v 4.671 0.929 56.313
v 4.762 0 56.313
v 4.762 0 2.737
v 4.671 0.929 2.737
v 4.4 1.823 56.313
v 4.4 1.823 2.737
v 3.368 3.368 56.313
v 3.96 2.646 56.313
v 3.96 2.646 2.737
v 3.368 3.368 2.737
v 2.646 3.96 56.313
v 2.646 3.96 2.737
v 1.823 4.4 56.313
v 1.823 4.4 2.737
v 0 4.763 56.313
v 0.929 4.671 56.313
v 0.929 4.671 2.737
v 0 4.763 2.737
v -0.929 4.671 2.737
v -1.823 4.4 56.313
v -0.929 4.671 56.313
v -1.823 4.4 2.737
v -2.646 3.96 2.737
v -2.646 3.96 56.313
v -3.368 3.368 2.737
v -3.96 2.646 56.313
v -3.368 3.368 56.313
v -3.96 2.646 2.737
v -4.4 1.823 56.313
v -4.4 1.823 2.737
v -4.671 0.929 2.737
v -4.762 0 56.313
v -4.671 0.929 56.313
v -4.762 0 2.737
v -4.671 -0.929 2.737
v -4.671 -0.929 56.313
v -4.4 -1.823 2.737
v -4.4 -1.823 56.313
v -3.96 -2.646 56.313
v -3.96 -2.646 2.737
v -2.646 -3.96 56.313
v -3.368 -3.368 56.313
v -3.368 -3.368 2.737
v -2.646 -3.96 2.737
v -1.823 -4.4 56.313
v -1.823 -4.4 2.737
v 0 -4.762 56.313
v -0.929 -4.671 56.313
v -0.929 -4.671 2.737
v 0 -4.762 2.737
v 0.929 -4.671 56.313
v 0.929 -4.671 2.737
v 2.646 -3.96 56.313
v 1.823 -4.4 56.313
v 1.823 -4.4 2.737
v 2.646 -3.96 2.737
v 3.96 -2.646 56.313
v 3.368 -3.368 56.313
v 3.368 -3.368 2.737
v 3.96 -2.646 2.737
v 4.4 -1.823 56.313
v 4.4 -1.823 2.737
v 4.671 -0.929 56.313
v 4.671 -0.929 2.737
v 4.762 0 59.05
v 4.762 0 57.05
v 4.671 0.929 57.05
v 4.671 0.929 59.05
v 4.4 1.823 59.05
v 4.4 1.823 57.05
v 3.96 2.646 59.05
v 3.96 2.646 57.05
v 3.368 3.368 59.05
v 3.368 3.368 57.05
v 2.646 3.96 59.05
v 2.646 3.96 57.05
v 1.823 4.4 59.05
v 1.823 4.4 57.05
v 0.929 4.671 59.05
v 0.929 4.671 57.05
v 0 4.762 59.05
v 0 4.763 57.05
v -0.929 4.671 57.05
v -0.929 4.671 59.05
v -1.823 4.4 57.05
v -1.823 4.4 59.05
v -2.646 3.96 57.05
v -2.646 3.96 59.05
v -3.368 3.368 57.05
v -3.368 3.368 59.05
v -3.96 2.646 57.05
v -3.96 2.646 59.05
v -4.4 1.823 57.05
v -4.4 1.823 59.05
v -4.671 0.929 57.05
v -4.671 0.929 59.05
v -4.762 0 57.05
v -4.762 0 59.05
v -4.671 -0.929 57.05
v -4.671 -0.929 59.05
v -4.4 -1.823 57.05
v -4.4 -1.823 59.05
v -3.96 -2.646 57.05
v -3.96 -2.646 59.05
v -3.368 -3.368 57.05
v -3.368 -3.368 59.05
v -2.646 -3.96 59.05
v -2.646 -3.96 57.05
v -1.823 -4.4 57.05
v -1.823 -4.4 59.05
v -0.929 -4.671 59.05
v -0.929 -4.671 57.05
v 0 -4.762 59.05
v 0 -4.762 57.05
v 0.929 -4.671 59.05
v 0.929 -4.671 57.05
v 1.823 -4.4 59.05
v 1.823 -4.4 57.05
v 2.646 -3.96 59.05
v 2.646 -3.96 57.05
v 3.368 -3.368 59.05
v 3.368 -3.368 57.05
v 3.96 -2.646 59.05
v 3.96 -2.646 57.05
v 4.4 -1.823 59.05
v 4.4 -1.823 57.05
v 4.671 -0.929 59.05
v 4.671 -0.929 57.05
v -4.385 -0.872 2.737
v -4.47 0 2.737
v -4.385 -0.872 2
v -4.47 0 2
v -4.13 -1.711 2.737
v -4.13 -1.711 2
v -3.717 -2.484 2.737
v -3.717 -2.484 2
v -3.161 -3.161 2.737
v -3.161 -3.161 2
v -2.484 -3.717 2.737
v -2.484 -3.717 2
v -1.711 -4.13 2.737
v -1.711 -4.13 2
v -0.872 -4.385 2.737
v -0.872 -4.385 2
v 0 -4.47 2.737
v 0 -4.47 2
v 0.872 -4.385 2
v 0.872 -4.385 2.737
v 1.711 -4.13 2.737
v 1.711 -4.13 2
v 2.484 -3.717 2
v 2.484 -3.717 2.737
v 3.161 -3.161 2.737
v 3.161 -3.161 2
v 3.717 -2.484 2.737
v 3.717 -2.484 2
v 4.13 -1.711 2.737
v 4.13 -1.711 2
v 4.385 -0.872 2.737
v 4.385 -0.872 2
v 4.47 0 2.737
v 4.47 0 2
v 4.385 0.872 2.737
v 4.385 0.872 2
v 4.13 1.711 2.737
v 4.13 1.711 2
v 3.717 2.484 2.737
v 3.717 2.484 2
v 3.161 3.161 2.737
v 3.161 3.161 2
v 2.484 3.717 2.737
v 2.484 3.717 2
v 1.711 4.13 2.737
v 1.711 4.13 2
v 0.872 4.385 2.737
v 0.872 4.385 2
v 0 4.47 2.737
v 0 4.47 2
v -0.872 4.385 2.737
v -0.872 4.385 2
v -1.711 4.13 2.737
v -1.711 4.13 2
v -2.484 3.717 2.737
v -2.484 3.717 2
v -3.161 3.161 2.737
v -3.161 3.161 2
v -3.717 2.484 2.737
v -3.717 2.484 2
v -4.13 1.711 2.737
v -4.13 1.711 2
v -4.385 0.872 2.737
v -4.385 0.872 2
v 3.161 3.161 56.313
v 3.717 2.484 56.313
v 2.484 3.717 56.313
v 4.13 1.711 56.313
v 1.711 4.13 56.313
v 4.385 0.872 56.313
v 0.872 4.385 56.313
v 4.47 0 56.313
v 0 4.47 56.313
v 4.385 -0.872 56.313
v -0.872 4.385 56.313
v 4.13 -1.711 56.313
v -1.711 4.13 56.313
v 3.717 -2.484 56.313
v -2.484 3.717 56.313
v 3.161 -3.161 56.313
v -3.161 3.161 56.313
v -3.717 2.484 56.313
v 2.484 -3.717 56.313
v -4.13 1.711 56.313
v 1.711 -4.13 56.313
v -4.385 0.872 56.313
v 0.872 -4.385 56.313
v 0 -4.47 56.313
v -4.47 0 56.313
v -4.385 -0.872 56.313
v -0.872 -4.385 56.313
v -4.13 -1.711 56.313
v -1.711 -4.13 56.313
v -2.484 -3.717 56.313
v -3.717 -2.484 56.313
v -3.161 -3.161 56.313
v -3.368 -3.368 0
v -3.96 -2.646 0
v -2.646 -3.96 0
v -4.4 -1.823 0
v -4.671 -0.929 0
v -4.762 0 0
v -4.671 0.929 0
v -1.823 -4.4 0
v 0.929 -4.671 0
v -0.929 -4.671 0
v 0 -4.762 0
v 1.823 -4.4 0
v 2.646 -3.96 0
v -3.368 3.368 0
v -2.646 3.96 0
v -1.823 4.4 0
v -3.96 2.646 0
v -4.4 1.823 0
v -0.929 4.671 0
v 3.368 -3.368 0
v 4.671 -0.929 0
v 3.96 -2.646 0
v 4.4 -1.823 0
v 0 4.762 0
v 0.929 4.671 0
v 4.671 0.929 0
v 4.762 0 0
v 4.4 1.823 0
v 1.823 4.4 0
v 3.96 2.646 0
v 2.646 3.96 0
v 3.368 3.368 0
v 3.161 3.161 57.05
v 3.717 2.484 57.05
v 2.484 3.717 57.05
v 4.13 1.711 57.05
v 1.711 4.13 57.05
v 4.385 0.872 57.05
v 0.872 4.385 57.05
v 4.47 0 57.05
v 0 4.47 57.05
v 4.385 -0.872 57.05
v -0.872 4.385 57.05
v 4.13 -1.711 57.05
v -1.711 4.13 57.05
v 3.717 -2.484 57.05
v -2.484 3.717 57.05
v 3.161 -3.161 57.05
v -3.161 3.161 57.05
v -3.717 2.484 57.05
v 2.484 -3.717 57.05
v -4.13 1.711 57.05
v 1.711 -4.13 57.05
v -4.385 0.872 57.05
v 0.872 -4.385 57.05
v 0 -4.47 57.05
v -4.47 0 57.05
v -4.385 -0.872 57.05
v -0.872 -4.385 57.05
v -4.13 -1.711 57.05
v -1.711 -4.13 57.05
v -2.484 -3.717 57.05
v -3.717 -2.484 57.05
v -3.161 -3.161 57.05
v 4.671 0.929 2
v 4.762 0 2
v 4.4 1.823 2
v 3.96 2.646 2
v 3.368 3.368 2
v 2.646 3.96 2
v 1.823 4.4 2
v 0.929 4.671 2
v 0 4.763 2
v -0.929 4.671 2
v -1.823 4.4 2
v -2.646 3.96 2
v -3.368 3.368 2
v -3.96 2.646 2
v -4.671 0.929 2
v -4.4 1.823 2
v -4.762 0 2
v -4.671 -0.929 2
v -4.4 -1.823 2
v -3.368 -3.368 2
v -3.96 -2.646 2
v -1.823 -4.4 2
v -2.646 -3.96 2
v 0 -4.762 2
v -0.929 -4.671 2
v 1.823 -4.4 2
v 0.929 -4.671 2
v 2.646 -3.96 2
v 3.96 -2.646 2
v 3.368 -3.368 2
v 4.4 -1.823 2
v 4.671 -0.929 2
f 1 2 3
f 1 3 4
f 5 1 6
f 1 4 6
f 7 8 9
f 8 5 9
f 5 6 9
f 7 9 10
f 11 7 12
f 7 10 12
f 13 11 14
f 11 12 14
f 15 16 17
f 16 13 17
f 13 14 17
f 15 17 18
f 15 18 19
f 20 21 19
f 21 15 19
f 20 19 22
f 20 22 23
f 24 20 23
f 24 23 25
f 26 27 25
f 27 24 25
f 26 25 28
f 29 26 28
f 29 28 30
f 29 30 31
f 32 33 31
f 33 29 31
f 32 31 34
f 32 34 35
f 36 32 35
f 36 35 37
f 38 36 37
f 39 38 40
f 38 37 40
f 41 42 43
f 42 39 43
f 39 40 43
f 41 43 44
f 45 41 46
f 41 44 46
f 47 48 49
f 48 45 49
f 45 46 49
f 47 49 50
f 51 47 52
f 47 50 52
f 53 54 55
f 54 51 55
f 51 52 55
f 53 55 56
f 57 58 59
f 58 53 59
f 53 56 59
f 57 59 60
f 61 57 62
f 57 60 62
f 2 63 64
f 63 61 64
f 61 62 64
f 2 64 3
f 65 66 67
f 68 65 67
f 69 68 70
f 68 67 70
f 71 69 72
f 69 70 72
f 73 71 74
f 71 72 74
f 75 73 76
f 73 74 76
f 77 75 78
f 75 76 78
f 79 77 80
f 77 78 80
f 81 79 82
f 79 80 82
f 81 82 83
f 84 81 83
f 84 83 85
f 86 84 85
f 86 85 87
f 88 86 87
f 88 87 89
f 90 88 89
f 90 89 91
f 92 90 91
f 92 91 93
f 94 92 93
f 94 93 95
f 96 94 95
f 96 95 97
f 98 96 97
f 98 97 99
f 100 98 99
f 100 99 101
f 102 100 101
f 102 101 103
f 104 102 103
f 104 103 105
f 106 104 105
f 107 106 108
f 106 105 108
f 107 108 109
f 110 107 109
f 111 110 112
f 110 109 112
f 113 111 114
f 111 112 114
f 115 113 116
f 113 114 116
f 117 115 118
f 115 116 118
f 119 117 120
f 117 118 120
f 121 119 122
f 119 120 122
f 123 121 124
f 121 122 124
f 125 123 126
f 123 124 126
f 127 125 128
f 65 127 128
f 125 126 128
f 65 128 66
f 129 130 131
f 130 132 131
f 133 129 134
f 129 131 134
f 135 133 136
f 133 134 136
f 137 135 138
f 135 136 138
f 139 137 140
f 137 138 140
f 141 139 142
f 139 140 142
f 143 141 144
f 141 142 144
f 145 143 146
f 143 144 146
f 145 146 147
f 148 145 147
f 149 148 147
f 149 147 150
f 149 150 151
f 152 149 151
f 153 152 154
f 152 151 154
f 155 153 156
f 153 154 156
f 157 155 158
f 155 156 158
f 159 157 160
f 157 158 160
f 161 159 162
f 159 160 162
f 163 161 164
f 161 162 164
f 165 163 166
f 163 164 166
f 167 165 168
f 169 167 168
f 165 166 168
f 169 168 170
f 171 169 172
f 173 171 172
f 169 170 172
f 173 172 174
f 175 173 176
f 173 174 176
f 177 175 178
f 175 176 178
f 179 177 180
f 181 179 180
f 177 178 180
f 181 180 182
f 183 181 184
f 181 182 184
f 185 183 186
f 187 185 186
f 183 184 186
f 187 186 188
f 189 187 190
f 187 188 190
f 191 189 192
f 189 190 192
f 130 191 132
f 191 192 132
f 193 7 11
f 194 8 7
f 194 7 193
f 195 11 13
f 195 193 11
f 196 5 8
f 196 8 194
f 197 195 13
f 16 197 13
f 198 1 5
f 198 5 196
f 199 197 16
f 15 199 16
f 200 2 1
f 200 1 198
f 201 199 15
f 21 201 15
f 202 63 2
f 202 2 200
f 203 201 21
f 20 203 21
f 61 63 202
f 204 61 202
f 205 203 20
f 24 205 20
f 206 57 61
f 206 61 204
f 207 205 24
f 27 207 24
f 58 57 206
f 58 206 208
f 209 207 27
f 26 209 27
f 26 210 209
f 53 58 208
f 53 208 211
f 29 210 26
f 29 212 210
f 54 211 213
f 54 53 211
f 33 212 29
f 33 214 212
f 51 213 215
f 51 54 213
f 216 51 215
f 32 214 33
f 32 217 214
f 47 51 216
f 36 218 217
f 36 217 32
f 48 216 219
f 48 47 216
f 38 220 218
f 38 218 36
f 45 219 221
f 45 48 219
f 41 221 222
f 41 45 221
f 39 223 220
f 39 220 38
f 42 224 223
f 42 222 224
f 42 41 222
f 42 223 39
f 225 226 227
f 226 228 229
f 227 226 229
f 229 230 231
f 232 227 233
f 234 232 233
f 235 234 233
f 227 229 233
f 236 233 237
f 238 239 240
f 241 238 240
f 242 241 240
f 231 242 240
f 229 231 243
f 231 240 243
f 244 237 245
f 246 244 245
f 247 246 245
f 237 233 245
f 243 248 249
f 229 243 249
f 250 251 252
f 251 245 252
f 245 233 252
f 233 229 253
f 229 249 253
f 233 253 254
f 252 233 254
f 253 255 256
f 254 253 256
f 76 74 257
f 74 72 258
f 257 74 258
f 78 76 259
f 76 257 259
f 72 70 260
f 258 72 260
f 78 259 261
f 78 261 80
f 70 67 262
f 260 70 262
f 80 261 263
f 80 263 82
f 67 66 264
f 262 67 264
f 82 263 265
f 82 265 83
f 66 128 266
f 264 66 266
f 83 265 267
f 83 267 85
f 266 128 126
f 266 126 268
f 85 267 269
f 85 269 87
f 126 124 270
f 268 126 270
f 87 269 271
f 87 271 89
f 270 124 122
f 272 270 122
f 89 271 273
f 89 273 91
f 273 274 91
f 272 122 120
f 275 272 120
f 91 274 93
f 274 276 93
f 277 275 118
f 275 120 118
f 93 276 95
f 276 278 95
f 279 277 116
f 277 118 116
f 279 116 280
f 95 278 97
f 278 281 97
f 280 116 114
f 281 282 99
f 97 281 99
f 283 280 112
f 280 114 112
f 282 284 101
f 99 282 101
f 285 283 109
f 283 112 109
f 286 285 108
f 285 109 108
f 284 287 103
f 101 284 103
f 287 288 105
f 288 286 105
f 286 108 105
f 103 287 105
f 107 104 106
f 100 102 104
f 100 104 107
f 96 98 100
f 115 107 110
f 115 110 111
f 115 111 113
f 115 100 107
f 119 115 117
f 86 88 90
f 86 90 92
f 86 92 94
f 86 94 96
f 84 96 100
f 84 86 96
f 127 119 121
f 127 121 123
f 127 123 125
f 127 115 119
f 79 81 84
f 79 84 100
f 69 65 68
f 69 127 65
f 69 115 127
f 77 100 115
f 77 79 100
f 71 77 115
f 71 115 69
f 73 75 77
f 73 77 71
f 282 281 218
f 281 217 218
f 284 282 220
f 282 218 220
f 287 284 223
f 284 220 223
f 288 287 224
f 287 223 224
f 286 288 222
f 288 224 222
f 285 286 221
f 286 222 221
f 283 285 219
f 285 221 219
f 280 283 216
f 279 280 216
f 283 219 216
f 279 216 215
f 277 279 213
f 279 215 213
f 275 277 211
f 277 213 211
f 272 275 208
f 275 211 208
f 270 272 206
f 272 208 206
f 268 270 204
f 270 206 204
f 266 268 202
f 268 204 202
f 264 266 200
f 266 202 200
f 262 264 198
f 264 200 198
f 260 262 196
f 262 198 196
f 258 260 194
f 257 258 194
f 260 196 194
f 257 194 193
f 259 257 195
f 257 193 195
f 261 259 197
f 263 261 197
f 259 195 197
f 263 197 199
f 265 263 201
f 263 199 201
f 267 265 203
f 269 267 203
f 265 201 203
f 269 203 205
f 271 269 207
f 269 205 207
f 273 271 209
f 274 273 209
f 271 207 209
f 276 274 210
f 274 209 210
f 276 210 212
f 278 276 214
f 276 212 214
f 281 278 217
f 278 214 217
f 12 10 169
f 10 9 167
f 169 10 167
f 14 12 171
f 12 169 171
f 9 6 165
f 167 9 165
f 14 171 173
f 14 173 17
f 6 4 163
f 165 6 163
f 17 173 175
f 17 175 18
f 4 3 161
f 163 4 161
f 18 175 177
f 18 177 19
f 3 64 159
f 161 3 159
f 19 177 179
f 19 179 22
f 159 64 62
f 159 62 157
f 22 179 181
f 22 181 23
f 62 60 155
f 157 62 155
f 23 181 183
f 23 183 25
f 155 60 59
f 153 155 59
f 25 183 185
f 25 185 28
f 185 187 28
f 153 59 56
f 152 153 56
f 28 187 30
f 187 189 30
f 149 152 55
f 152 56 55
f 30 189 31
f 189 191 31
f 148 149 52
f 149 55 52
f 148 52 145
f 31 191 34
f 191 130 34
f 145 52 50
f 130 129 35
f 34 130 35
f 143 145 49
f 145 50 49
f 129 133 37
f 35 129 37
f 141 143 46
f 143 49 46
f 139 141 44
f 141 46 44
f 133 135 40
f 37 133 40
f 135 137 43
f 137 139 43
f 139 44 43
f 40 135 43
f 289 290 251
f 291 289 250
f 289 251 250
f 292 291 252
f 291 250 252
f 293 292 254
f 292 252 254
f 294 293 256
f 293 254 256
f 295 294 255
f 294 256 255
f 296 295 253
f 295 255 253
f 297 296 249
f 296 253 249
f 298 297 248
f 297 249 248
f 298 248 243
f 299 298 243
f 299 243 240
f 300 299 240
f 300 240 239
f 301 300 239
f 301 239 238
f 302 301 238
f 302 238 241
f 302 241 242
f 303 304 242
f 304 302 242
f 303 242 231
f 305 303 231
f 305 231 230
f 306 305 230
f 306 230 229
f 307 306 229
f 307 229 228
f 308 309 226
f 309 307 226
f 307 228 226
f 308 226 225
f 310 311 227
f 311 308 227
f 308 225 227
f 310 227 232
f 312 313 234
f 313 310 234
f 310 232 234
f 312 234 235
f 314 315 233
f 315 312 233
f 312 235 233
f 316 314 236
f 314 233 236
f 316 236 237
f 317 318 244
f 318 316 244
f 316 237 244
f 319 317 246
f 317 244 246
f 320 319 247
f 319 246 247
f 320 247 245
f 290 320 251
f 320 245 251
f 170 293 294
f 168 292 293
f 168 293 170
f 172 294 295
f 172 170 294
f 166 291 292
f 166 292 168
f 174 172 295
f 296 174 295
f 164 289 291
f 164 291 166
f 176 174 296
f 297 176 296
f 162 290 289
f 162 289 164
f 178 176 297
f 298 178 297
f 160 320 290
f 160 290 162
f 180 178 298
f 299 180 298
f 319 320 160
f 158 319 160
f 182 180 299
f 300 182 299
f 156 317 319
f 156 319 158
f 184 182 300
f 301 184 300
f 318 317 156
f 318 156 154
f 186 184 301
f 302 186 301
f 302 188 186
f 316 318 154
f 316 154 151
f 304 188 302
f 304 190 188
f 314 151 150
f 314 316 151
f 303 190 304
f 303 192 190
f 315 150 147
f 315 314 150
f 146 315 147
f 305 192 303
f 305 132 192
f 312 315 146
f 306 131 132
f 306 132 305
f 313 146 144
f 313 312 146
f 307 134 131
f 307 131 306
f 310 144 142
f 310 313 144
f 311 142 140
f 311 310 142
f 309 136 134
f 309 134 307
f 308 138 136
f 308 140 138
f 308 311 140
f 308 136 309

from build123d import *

# Parameters (mm, degrees)
SKETCH1_R           = 4.7625
BOSS_EXTRUDE1_DEPTH = 59.05
SKETCH2_W           = 0.2921
SKETCH2_H           = 0.7366


with BuildPart() as part:
    # Sketch1 → Boss-Extrude1 (new body)
    with BuildSketch(Plane.XY):
        Circle(SKETCH1_R)
    extrude(amount=BOSS_EXTRUDE1_DEPTH)

    # Sketch2 → Cut-Revolve1 (revolve, cut)
    with BuildSketch(Plane(origin=(0, 0, 0), x_dir=(1, 0, 0), z_dir=(0, 1, 0))):
        with Locations((-4.61645, -2.3683)):
            Rectangle(SKETCH2_W, SKETCH2_H)
        with Locations((-4.61645, -56.6817)):
            Rectangle(SKETCH2_W, SKETCH2_H)
    revolve(axis=Axis((0, 0, 0), (0, 0, 1)), mode=Mode.SUBTRACT)


solid = part.part
